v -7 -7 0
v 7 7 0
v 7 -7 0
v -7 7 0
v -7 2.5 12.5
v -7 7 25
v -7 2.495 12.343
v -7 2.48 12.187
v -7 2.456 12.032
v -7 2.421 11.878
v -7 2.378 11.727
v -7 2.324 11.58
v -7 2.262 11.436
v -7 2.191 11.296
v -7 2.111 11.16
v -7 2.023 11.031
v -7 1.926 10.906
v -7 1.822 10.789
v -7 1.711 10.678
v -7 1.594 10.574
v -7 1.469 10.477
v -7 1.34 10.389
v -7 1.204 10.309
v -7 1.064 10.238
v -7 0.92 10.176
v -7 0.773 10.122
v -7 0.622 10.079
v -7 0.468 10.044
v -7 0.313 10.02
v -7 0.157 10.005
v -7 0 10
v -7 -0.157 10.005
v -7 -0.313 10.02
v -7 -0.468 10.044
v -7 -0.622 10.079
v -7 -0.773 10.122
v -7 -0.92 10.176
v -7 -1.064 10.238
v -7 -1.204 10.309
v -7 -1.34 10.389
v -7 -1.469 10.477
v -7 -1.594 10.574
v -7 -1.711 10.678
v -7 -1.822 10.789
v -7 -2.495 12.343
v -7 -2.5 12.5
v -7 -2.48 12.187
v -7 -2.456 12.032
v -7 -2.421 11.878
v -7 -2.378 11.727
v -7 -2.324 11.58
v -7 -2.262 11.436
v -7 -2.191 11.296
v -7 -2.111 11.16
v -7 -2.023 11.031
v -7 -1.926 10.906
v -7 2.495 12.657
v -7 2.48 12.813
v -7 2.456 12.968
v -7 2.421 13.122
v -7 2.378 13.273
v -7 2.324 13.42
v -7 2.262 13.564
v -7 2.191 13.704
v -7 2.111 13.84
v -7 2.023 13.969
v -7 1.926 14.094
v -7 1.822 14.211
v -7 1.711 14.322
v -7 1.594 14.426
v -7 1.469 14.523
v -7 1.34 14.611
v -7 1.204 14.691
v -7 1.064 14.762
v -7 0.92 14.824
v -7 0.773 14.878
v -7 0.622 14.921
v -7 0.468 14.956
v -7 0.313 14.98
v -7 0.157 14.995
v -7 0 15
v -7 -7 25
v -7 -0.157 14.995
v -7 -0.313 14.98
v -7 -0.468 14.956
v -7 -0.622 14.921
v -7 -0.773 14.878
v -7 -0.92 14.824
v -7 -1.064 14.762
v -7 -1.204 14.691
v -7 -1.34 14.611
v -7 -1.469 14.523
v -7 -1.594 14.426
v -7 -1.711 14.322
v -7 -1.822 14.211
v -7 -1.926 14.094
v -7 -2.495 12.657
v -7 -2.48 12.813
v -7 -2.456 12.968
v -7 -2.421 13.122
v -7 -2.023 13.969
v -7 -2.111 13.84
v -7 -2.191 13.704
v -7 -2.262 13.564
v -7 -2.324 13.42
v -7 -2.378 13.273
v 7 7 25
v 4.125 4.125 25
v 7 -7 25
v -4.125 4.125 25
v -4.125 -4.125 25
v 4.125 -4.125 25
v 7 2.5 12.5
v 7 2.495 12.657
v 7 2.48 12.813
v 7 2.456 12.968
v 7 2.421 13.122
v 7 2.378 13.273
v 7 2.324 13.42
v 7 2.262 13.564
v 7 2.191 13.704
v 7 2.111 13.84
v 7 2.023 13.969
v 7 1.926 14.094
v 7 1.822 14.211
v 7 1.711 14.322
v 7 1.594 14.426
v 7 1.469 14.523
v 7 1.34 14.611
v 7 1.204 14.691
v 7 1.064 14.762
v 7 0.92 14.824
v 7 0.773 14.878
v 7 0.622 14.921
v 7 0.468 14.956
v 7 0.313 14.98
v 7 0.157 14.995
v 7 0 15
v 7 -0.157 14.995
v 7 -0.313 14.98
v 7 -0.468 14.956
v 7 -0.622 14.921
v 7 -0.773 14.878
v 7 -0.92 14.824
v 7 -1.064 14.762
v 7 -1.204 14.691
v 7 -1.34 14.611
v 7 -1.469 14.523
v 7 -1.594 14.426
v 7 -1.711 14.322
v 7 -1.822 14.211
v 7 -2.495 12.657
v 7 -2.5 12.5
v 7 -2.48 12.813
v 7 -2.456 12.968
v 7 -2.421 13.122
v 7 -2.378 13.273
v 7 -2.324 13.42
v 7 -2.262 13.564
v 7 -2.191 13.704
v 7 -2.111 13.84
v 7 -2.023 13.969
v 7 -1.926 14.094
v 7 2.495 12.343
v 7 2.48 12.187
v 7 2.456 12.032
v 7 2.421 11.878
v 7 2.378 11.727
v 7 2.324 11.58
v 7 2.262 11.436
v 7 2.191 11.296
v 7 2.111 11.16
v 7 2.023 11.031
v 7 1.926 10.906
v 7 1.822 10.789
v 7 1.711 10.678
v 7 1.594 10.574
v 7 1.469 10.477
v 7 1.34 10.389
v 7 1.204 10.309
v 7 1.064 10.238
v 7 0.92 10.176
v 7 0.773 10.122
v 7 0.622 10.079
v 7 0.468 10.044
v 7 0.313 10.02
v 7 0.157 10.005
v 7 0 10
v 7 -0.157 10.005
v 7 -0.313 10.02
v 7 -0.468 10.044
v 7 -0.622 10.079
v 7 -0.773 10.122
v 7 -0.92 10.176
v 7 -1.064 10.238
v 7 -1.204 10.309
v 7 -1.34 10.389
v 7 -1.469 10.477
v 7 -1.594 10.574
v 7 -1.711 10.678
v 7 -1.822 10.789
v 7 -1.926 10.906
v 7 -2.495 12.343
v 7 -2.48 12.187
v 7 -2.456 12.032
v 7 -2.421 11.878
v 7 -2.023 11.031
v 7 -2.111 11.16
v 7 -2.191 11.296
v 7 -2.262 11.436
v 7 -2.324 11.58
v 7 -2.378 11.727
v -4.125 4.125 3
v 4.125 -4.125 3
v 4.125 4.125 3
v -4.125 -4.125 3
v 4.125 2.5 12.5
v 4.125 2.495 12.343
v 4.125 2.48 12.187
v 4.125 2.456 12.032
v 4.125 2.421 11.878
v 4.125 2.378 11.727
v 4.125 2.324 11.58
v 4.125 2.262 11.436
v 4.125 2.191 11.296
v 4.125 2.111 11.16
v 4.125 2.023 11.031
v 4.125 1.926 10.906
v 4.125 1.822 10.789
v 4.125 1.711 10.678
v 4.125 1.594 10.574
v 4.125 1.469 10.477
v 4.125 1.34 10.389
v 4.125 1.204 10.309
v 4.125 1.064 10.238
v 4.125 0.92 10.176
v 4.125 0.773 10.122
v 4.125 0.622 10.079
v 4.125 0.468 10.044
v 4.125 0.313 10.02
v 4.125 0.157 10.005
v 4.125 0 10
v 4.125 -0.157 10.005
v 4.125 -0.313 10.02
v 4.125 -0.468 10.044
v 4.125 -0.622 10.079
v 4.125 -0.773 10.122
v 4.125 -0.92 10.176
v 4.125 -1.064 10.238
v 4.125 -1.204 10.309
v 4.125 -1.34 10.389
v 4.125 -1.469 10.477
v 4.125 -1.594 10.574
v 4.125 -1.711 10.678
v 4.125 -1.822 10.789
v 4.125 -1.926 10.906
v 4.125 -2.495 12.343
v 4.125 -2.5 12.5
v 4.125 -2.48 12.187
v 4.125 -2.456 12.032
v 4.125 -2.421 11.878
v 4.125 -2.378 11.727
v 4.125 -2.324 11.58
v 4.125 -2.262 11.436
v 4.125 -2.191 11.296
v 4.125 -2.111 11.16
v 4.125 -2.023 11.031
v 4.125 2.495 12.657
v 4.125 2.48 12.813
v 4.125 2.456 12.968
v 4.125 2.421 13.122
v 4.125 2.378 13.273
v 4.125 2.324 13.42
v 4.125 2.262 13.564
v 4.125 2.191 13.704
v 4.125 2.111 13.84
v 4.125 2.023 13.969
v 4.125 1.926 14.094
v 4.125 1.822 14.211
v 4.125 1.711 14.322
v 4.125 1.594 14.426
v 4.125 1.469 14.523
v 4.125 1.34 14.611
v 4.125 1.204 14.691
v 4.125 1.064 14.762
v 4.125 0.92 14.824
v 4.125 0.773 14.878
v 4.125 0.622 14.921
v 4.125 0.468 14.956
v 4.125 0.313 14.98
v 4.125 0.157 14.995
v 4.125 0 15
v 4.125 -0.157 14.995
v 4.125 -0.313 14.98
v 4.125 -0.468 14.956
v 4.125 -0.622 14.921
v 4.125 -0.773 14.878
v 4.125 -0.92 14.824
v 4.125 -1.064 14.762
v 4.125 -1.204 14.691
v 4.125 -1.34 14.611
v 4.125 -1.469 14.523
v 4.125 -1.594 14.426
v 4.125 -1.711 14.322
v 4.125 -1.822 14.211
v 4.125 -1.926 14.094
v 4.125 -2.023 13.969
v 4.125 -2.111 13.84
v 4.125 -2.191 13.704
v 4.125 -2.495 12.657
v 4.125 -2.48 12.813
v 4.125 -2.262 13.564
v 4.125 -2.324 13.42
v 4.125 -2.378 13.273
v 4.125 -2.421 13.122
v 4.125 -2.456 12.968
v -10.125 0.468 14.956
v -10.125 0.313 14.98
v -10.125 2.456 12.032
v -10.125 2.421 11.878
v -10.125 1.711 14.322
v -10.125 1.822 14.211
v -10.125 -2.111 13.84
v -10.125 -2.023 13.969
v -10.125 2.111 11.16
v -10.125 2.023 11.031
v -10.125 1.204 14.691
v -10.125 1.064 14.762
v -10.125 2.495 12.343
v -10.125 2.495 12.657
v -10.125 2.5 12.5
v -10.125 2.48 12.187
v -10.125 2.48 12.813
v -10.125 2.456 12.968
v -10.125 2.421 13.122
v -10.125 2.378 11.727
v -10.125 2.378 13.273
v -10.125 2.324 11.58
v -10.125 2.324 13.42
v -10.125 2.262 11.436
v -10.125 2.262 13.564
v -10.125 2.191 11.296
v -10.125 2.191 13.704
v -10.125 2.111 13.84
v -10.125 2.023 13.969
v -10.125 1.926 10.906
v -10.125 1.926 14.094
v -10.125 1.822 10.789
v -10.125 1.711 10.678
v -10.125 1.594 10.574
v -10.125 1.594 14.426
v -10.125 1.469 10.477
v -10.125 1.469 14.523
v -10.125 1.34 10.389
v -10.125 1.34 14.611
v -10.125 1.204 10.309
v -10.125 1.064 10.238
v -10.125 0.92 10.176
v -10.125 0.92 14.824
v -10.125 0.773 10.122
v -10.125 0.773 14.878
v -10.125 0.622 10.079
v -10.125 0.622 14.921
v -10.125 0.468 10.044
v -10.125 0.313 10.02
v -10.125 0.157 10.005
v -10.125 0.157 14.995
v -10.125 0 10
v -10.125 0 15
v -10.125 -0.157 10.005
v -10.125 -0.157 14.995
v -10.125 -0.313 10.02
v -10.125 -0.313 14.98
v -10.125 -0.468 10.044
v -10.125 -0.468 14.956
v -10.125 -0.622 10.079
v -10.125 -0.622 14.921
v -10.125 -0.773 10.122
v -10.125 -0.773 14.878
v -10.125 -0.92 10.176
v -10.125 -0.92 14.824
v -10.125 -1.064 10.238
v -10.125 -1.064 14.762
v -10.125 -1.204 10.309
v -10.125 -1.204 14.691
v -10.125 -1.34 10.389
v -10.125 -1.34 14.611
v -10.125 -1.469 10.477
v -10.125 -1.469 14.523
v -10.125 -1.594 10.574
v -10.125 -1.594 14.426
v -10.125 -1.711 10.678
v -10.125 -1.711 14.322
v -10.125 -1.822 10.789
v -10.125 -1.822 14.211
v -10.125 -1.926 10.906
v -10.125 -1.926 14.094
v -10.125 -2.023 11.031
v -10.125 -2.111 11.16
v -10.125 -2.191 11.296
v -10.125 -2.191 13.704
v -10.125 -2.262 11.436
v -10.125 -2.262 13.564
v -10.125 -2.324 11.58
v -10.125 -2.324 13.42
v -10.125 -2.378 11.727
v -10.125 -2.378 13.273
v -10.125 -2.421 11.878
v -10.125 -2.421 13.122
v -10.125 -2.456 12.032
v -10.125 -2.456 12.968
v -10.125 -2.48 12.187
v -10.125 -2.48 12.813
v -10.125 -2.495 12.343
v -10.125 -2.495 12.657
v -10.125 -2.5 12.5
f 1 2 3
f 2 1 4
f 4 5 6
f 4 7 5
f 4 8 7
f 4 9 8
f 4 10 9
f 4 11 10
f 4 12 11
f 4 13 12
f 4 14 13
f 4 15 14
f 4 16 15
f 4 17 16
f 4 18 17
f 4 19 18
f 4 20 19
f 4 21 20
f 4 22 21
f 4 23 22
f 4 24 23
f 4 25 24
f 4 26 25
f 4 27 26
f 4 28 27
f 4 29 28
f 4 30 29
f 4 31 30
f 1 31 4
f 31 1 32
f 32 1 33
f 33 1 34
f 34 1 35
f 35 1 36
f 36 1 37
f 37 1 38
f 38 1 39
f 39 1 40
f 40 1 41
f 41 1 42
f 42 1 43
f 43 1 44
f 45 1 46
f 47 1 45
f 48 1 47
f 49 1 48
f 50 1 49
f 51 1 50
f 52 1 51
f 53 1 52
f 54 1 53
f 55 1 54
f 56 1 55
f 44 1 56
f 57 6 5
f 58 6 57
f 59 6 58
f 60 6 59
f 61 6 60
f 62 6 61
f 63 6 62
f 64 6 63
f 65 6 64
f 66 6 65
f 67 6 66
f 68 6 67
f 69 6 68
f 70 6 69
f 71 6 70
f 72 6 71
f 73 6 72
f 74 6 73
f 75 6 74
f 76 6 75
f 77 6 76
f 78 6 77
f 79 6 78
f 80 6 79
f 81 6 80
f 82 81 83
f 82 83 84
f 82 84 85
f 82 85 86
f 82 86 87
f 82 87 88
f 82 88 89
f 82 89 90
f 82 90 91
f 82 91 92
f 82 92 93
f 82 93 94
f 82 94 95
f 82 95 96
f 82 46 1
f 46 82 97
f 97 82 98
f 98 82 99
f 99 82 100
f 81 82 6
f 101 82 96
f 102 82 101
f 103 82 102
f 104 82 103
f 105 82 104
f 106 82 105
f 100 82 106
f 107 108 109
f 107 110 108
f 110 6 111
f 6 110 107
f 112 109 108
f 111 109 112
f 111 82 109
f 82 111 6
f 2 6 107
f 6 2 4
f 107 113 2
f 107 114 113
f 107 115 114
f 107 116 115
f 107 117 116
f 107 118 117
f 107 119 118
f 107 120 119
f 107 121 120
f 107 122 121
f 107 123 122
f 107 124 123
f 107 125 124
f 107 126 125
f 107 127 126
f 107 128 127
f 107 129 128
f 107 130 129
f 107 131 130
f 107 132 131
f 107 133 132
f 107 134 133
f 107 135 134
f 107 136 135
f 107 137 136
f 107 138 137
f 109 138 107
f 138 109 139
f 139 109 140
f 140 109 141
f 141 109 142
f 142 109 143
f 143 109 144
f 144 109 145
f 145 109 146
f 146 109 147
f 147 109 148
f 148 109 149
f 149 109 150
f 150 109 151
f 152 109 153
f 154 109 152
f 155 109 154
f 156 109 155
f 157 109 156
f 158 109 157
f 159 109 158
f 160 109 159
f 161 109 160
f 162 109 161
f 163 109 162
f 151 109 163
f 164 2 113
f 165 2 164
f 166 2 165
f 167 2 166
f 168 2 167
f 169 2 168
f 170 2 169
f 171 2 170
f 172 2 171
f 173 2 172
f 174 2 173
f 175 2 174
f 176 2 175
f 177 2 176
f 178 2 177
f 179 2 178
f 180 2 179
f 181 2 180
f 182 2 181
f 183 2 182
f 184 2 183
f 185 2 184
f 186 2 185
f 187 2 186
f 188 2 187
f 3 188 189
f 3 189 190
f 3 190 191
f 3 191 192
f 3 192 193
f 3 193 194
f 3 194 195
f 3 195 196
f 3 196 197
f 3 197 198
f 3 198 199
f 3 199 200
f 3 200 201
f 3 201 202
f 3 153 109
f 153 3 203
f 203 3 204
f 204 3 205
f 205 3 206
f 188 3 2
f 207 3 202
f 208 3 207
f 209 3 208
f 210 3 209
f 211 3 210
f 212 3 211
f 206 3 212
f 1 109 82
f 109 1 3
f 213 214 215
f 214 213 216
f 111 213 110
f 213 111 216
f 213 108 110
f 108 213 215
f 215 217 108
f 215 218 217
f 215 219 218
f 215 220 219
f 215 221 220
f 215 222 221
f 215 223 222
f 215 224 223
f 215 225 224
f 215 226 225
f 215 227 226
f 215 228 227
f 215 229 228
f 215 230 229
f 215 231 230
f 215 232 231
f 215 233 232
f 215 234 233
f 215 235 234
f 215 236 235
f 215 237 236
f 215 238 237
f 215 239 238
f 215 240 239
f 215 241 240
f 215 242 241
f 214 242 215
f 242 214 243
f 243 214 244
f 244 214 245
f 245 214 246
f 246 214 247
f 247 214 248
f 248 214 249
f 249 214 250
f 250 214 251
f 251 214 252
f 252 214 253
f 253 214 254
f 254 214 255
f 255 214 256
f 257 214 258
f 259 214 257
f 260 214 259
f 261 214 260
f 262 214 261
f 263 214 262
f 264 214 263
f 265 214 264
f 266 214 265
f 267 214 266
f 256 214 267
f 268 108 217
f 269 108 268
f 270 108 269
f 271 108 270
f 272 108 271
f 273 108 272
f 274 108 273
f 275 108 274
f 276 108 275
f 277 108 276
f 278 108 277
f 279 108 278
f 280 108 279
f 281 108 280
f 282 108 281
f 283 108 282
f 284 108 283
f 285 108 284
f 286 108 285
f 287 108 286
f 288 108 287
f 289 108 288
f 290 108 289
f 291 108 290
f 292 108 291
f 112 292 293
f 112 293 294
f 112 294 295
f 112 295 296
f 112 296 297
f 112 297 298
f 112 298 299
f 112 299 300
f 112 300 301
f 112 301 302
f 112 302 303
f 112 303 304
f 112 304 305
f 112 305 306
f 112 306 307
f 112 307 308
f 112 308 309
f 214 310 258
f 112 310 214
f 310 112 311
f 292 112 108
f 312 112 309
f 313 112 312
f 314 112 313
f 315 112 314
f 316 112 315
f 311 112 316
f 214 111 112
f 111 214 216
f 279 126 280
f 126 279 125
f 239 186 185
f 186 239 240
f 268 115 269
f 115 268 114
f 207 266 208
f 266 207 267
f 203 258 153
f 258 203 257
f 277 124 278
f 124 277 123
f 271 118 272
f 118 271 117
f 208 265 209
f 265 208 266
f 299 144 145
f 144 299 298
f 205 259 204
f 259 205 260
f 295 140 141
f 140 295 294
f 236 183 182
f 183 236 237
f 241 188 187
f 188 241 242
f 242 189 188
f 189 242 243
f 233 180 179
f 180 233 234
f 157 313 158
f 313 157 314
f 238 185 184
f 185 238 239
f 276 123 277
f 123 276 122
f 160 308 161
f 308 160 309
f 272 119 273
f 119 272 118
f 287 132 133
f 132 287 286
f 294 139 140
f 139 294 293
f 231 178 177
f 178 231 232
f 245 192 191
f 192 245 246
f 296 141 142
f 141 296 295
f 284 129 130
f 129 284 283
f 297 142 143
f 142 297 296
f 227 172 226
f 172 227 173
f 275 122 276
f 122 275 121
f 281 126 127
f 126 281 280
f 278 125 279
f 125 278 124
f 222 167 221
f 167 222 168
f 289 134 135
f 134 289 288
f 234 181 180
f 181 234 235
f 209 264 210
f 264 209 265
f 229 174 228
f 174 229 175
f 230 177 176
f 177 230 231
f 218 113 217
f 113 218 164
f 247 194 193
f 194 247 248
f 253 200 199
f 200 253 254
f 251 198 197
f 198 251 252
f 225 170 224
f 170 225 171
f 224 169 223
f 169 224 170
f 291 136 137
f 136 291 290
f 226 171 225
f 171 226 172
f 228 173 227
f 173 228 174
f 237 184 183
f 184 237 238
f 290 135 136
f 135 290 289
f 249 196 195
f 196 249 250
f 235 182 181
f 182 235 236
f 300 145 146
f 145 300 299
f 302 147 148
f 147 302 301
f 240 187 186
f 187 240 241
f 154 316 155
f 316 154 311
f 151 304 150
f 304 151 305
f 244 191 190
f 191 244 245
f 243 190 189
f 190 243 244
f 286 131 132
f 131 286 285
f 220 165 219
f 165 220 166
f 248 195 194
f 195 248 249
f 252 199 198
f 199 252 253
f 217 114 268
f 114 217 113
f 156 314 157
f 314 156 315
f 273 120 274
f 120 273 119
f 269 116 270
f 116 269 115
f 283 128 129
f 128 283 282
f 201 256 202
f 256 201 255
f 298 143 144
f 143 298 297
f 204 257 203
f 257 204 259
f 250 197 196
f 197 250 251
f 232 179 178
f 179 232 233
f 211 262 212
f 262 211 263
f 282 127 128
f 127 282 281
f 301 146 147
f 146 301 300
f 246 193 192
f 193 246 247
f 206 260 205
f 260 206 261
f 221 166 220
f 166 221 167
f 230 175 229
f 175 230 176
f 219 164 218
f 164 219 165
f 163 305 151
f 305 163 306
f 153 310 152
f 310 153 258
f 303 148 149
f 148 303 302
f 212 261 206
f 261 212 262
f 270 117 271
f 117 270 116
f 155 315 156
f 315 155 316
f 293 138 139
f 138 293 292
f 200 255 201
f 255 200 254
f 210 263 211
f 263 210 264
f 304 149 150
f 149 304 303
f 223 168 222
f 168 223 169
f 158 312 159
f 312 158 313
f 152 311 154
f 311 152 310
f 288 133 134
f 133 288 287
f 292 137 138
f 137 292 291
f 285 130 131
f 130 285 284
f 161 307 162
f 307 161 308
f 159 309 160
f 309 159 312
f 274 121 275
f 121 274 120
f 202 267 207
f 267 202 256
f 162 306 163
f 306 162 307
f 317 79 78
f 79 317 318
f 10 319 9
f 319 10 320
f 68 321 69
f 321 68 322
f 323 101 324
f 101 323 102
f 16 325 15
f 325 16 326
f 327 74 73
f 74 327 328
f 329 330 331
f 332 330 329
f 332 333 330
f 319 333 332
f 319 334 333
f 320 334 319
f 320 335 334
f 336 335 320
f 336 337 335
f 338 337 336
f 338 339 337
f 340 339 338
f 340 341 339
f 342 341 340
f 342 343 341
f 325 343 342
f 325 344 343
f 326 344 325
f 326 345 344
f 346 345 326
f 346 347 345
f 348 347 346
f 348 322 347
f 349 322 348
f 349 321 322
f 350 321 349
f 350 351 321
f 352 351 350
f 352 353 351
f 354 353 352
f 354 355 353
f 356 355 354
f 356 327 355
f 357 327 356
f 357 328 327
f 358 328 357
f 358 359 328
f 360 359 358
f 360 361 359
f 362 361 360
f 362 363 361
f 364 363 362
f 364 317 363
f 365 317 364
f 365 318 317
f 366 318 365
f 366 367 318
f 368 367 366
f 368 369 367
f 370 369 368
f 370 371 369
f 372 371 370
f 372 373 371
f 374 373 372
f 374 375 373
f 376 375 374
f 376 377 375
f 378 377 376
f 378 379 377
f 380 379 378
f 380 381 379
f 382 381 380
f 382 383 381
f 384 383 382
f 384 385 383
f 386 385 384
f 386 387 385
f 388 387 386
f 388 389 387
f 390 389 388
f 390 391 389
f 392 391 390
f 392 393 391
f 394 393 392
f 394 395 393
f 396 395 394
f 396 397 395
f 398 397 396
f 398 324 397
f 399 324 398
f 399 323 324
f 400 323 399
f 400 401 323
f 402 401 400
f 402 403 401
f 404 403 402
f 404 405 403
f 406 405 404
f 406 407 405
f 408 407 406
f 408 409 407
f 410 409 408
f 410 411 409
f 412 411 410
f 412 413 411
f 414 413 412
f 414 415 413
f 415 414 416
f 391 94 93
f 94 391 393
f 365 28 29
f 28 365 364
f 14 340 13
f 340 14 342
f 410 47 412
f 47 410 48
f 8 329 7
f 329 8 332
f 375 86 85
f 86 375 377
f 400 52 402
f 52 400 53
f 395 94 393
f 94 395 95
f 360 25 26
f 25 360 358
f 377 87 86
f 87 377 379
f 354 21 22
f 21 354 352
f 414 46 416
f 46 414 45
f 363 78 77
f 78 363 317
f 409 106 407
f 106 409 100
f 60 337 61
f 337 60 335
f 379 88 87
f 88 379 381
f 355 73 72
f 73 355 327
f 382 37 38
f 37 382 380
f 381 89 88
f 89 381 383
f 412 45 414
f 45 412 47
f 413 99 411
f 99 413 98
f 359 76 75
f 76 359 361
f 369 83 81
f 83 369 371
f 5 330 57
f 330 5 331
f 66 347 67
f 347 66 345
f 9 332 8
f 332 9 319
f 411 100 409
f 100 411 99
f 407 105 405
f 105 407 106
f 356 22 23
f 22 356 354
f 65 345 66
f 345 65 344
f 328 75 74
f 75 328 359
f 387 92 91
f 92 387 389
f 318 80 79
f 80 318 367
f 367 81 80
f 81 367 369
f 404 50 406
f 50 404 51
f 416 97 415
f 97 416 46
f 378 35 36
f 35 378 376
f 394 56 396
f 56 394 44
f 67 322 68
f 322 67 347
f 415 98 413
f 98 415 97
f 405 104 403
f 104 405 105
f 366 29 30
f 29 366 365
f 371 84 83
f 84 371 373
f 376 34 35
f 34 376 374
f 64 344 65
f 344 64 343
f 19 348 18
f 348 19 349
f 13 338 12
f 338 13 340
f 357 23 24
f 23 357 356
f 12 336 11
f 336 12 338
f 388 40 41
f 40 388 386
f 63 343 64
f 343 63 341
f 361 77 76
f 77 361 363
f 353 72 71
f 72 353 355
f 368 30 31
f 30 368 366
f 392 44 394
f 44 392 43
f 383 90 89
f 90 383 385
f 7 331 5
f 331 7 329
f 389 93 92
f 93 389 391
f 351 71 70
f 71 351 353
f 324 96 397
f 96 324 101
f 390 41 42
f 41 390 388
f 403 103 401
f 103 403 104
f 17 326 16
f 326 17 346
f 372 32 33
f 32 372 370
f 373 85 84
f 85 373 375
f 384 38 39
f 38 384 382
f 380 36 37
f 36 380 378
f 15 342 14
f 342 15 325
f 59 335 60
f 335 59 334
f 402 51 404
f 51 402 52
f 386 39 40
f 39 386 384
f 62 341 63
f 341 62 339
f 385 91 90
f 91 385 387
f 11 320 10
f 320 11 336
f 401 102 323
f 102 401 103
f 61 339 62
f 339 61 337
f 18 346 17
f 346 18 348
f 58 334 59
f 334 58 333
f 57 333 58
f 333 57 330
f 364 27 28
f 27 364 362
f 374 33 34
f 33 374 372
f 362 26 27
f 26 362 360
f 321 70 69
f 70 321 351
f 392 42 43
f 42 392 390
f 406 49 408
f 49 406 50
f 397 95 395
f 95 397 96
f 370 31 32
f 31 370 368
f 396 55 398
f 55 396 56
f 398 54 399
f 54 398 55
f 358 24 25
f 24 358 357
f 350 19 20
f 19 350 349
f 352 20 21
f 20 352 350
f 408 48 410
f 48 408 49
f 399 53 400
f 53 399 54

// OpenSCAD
$fn = 100;
stand_height = 8;

// tolerance for fitting parts together
gap = 0.25;

// who would have though an m5 screw would be 5mm
// adjust this so the screw threads hold
m5_diameter = 5;

// for camera holder
mount_screw_radius = 5.25 / 2;
mount_screw_length = 6;
height = 25;

thickness = 3;

union() {
    difference() {
        linear_extrude(height) square([
            stand_height + thickness * 2,
            stand_height + thickness * 2
        ], center=true);
        
        translate([0, 0, thickness])
            linear_extrude(height)
                square([
                    stand_height + gap,
                    stand_height + gap
                ], center=true);
        
        // Screw hole
        translate([
            0,
            0,
            height / 2
        ]) rotate([0, 90, 0]) cylinder(100, r=m5_diameter/2);
    }
    
    translate([
        
        -(stand_height + gap)/2 - thickness / 2,
        0,
        height / 2
    ]) rotate([
        0, -90, 0
    ]) cylinder(mount_screw_length - (thickness/2), r=m5_diameter/2);
}
